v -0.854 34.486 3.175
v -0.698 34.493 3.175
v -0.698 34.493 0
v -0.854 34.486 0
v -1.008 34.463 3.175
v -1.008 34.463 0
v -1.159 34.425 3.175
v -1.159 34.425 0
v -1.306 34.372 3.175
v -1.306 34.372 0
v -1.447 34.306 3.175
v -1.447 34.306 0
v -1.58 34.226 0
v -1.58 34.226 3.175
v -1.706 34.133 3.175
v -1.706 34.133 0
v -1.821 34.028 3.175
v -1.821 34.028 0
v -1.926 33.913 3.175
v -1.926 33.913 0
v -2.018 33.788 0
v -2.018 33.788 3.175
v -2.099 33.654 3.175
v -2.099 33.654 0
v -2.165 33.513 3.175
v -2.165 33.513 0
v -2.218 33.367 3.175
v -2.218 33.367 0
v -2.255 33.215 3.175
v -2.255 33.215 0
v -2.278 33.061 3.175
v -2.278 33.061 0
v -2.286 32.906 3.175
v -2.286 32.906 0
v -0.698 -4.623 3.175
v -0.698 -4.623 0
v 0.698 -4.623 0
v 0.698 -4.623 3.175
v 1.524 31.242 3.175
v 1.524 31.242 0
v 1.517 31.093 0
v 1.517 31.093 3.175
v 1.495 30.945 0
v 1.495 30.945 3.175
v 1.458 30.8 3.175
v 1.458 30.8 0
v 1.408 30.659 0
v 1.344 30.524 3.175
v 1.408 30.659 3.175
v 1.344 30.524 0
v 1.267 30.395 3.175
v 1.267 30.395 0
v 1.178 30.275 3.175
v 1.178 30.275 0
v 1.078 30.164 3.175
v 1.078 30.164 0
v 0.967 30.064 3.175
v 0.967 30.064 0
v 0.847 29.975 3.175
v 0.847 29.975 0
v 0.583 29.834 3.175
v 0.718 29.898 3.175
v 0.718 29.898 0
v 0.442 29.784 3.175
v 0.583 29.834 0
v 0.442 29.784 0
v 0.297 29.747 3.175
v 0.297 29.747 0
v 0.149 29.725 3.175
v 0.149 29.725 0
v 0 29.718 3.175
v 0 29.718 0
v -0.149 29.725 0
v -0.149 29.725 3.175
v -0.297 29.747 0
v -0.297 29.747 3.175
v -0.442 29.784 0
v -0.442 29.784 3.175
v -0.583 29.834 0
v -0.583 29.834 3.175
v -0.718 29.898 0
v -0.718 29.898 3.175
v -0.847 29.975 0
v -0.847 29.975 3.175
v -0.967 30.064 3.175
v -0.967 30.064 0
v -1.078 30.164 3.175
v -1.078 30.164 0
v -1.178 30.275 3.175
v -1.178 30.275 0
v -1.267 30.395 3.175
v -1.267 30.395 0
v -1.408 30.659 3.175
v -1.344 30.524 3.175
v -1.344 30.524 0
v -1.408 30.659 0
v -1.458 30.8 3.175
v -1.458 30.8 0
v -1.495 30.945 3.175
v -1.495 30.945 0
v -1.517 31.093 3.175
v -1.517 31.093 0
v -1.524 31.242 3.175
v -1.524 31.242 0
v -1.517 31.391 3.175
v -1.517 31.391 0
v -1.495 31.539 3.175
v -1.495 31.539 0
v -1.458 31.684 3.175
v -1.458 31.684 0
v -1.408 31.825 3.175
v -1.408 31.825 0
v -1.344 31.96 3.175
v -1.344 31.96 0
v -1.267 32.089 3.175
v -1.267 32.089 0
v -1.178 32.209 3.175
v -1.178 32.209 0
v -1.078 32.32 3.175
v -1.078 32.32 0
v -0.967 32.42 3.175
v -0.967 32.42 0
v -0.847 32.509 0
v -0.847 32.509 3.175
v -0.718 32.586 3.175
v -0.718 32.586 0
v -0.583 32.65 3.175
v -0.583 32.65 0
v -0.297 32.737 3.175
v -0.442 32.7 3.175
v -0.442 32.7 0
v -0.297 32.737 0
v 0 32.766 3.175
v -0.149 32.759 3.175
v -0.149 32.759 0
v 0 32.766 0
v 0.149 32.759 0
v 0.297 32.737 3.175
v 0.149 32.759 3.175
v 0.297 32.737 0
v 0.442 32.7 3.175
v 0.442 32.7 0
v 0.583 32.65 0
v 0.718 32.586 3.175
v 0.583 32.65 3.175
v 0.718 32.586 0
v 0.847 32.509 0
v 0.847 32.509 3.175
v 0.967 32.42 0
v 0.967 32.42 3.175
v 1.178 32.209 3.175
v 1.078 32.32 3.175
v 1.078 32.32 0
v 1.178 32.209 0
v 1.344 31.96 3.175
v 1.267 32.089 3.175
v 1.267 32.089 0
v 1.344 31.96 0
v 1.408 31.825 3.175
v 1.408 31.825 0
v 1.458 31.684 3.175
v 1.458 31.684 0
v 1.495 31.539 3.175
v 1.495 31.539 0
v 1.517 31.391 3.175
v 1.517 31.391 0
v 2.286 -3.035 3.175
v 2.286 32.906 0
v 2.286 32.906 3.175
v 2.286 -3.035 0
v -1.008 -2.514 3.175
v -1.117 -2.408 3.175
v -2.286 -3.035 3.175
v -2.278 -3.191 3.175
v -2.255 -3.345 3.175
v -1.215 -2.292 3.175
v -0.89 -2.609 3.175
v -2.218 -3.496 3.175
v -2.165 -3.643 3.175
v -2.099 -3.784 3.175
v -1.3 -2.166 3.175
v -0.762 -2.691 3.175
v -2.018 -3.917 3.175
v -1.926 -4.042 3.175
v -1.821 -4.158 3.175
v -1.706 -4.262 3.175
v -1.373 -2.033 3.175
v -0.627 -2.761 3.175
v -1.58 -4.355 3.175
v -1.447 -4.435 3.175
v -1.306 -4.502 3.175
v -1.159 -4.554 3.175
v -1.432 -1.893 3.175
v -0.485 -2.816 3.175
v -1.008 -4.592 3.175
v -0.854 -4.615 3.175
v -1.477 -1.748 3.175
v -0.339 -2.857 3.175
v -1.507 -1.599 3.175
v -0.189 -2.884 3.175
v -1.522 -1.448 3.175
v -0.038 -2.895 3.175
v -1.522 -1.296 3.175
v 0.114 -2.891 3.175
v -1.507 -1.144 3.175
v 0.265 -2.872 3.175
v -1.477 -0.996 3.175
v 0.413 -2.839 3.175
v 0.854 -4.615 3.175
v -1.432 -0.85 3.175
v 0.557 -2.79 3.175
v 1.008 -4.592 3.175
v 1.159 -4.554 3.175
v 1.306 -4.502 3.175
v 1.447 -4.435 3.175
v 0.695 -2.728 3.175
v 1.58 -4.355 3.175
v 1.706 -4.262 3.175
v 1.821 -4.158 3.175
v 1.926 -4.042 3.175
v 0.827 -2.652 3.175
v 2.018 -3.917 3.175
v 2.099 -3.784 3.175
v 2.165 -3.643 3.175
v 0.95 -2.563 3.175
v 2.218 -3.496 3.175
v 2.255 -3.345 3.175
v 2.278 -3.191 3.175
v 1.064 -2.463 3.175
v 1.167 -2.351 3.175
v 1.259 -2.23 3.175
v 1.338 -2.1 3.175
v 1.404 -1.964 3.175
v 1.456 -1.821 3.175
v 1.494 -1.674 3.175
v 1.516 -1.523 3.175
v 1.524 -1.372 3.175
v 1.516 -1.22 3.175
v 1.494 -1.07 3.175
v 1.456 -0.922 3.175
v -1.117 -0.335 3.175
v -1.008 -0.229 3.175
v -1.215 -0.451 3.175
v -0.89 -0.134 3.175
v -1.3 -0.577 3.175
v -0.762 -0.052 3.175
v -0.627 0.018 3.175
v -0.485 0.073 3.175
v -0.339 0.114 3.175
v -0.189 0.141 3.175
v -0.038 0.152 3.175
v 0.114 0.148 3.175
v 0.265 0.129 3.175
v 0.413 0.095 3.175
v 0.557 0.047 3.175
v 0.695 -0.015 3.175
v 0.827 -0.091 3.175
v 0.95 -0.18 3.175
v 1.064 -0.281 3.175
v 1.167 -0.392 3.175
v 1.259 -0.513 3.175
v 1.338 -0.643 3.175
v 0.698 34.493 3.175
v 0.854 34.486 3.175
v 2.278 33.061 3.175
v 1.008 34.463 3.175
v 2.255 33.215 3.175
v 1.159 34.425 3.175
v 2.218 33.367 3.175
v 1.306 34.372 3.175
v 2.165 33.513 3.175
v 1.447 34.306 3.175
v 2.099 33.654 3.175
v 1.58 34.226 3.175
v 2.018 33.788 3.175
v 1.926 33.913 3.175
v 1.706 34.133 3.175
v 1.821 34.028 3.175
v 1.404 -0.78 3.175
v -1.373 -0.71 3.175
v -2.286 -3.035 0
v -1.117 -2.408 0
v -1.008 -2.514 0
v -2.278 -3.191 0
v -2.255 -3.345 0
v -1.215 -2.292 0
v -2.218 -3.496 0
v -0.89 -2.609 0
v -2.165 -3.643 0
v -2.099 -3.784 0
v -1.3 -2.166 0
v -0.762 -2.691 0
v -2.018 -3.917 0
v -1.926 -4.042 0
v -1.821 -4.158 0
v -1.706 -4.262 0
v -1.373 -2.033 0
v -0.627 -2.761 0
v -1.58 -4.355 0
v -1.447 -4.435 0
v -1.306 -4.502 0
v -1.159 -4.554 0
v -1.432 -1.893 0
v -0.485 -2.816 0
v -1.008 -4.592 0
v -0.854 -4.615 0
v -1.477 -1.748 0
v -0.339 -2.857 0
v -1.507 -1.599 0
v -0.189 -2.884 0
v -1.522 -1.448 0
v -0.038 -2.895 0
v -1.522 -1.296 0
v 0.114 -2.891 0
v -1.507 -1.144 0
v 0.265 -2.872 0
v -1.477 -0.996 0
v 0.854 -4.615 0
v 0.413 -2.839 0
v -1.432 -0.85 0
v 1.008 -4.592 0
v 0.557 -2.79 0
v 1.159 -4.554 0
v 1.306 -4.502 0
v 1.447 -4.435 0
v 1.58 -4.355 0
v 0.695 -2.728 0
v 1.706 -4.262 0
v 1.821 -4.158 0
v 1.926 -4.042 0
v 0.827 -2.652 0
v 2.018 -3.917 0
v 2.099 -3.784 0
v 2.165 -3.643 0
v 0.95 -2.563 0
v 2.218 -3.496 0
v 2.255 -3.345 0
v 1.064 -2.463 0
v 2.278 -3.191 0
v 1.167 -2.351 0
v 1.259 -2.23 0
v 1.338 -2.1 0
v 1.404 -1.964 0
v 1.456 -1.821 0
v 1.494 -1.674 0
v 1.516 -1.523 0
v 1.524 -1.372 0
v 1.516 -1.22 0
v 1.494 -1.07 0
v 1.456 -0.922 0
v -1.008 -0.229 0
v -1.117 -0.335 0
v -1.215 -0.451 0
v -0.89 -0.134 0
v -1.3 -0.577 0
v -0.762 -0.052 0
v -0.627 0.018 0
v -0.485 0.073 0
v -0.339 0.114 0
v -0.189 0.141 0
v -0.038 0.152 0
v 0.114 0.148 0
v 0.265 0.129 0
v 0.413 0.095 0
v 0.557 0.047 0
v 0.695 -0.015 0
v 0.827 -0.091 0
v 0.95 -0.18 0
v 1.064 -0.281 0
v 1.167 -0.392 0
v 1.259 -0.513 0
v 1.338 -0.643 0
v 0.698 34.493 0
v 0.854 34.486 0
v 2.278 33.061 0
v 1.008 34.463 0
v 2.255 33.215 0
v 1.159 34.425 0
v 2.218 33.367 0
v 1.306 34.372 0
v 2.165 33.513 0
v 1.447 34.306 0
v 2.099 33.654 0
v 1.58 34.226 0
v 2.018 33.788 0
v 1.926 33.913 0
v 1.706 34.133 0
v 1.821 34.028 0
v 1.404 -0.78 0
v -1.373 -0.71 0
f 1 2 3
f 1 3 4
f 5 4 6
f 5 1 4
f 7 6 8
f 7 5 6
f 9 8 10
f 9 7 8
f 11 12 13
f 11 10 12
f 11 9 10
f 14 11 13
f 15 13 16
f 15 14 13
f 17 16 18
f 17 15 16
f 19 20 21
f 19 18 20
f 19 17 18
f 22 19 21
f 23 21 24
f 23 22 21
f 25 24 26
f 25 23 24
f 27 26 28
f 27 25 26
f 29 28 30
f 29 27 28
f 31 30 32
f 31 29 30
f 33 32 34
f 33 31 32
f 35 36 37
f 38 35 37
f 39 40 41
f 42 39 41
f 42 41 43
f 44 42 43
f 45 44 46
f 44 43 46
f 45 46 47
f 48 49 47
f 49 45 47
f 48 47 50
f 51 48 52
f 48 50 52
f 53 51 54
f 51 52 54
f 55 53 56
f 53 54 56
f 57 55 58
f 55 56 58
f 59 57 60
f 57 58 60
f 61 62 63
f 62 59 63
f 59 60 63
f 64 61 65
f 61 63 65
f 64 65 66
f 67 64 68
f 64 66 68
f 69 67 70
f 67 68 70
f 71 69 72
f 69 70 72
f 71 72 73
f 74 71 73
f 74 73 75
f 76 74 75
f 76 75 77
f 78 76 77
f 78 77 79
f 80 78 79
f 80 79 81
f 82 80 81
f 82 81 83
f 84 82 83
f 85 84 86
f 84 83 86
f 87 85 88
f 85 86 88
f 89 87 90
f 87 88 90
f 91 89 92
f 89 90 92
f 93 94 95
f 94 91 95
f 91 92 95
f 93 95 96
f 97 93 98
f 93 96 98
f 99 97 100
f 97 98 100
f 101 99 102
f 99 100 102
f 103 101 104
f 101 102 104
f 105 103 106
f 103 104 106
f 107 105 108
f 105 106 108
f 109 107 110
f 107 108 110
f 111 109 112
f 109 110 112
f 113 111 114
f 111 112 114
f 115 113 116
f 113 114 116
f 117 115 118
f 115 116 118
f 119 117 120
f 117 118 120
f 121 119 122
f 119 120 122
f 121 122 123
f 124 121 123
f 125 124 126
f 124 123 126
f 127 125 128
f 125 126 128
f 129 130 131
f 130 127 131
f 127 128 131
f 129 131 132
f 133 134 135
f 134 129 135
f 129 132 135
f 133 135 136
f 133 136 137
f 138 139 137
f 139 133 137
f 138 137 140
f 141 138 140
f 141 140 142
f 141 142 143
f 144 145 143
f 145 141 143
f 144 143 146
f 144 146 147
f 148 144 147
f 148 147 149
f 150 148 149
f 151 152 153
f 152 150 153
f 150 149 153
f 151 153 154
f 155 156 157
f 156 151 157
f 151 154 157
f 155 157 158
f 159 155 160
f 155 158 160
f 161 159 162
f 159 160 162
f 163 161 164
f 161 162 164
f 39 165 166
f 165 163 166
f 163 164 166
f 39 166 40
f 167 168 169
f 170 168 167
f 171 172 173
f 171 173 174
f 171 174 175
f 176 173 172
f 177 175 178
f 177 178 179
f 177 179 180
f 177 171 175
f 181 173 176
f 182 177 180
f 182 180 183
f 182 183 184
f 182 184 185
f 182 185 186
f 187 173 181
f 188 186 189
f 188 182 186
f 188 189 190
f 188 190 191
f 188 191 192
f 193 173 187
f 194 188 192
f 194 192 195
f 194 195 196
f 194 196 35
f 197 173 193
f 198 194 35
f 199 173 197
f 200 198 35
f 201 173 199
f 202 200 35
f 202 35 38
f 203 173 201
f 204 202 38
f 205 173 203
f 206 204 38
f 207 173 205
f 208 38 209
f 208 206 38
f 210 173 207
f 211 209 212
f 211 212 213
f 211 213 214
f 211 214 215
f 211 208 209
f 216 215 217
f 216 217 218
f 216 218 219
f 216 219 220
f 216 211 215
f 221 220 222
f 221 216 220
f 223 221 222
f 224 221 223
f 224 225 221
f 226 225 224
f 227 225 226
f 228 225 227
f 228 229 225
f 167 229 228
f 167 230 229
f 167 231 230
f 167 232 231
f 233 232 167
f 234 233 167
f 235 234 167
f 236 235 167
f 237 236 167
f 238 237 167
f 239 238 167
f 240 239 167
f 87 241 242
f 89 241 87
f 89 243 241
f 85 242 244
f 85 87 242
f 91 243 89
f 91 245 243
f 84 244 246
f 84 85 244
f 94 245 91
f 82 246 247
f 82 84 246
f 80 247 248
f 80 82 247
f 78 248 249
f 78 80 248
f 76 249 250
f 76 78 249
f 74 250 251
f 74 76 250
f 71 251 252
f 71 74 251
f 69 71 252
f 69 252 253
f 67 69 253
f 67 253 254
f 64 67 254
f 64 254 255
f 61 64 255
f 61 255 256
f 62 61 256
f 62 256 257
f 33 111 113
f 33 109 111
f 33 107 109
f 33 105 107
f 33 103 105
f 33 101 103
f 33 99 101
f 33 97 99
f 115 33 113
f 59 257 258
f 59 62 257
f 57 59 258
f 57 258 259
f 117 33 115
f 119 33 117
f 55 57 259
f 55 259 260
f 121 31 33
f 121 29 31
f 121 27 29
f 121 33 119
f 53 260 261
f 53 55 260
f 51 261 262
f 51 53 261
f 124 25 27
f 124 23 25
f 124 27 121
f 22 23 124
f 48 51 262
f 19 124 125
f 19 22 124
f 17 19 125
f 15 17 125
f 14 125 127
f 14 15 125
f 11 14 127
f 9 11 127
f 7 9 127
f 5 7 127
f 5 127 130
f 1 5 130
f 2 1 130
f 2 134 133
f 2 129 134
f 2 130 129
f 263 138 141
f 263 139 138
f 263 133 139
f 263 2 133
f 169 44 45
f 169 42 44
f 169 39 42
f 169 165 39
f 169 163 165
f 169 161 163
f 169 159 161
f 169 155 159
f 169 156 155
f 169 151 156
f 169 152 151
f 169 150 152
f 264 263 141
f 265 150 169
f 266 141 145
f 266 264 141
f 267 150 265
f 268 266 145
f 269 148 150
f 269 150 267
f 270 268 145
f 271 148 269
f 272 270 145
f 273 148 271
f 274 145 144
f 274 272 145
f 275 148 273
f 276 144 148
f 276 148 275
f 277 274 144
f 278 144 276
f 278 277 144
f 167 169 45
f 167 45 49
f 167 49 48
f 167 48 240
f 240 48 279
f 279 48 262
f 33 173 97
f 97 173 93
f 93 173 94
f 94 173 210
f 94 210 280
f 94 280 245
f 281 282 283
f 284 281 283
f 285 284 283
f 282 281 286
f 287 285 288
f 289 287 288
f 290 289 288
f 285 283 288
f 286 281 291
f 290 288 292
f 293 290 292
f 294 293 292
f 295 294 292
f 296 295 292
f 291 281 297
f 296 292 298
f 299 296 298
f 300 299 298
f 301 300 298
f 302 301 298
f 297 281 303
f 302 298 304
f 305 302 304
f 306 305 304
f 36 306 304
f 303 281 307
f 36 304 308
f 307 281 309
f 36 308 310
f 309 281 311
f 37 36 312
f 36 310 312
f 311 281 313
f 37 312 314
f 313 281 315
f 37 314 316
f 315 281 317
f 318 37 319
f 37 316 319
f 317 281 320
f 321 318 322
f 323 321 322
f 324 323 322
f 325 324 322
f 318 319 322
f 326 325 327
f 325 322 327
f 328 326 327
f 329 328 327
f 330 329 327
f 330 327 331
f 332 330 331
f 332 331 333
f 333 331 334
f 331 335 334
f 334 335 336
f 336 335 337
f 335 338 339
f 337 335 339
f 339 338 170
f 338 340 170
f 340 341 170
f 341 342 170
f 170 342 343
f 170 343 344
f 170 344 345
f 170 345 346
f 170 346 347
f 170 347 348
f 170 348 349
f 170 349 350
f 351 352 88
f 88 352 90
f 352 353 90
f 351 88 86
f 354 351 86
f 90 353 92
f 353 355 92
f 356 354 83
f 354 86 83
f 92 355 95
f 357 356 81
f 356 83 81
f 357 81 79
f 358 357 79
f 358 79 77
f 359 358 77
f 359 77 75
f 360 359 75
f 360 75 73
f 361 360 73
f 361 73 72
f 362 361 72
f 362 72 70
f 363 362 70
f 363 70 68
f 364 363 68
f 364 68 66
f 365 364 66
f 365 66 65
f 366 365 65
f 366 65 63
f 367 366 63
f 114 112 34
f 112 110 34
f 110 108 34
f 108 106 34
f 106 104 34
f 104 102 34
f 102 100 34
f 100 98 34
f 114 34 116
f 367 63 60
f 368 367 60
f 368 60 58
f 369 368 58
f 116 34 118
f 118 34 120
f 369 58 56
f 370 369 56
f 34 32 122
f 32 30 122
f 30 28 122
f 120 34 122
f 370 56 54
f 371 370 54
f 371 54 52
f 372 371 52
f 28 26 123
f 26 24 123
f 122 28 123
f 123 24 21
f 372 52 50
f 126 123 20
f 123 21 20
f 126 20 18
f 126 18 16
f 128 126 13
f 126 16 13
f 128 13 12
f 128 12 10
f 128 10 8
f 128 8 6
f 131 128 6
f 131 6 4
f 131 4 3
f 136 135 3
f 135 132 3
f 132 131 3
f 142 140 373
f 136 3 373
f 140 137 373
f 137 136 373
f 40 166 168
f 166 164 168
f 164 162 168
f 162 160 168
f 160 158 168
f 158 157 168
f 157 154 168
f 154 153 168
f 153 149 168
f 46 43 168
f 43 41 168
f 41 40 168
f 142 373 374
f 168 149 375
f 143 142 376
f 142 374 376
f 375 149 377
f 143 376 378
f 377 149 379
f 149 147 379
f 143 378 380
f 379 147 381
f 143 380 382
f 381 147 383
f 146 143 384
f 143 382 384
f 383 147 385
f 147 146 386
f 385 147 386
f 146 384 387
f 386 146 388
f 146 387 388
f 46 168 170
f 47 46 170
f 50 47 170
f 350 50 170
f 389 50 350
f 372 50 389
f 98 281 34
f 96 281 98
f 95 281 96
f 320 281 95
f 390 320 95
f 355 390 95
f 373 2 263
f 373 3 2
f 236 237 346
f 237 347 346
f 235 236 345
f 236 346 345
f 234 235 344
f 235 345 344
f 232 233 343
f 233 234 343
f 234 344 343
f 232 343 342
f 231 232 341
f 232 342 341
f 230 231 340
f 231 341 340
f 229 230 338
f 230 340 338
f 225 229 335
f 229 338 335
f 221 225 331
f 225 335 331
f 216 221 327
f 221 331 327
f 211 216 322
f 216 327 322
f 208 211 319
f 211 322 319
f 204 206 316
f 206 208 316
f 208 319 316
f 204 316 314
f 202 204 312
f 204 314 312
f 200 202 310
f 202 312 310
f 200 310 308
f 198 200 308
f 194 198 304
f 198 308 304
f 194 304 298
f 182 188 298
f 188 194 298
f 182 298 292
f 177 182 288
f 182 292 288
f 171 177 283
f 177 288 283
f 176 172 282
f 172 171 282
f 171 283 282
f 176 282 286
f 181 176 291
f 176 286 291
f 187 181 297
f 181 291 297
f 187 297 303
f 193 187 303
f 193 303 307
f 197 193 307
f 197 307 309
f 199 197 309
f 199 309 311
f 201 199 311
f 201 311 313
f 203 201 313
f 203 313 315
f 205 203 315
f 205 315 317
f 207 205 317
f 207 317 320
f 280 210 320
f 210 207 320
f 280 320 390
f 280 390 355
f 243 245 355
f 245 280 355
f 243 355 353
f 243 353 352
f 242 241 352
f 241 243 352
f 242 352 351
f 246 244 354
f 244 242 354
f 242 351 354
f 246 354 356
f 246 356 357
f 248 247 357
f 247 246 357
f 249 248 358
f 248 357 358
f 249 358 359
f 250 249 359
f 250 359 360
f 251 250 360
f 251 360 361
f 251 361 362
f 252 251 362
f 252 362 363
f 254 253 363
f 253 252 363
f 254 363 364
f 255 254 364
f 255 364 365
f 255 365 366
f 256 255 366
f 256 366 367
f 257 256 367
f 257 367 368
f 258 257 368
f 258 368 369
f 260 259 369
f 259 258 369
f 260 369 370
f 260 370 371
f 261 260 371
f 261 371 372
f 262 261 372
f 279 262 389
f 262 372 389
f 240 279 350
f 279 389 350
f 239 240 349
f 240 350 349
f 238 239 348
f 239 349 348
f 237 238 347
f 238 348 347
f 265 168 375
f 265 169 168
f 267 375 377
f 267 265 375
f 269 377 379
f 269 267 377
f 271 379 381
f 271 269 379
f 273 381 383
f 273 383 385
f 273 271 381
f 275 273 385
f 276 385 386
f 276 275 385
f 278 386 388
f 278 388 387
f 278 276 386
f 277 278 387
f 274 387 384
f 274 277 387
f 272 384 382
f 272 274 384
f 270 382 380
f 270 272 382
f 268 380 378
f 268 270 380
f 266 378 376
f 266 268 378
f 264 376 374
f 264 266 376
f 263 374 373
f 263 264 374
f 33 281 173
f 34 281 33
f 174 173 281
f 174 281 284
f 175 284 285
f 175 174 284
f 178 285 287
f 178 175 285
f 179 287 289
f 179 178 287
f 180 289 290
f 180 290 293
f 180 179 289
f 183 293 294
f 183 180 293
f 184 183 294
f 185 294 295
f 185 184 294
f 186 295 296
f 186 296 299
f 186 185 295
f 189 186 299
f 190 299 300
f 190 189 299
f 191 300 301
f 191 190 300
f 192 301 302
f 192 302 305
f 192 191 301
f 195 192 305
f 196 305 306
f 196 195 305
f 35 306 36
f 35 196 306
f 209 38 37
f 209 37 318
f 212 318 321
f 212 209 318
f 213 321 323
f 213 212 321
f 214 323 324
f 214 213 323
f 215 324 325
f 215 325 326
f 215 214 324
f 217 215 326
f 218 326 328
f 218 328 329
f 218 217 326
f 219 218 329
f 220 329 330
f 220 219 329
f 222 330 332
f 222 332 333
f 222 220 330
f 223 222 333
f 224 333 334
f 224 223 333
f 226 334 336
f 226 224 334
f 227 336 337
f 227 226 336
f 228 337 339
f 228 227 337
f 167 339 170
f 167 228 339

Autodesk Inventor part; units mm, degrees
ref_plane "YZ Plane" through (0, 0, 0) normal (1, 0, 0) x (0, 1, 0)
ref_plane "XZ Plane" through (0, 0, 0) normal (0, 1, 0) x (-1, 0, 0)
ref_plane "XY Plane" through (0, 0, 0) normal (0, 0, 1) x (1, 0, 0)
sketch "Sketch1" plane through (0, 0, 0) normal (0, 0, 1) x (1, 0, 0)
  line L0 (-2.286, -3.4798) -> (2.286, -3.4798)
  line L1 (-2.286, -3.4798) -> (-2.286, 33.3502)
  line L2 (-2.286, 33.3502) -> (2.286, 33.3502)
  line L3 (2.286, 33.3502) -> (2.286, -3.4798)
  line L4 (2.286, 14.9352) -> (-2.286, 14.9352)
  line L5 (0, 33.3502) -> (0, 31.242)
  circle A0 centre (0, 31.242) radius 1.524
  circle A1 centre (0, -1.3716) radius 1.524
  line L6 (0, -3.4798) -> (0, -4.6228)
  line L7 (0, -4.6228) -> (2.286, -4.6228)
  line L8 (2.286, -4.6228) -> (2.286, -3.4798)
  line L9 (-2.286, -3.4798) -> (-2.286, -4.6228)
  line L10 (-2.286, -4.6228) -> (0, -4.6228)
  line L11 (0, 34.4932) -> (2.286, 34.4932)
  line L12 (2.286, 34.4932) -> (2.286, 33.3502)
  line L13 (-2.286, 33.3502) -> (-2.286, 34.4932)
  line L14 (-2.286, 34.4932) -> (0, 34.4932)
  point P0 (0, 0)
  dimension "d0" = 4.572
  dimension "d1" = 36.83
  dimension "d2" = 2.1082
  dimension "d3" = 3.048
  dimension "d7" = 1.143
extrude "Extrusion1" add sketch "Sketch1" along normal blind 3.175
fillet "Fillet2" radius 1.5875 4 edges at (2.286, 34.4932, 1.5875) (-2.286, 34.4932, 1.5875) (-2.286, -4.6228, 1.5875) (2.286, -4.6228, 1.5875)
properties part number "hank - linkage"
